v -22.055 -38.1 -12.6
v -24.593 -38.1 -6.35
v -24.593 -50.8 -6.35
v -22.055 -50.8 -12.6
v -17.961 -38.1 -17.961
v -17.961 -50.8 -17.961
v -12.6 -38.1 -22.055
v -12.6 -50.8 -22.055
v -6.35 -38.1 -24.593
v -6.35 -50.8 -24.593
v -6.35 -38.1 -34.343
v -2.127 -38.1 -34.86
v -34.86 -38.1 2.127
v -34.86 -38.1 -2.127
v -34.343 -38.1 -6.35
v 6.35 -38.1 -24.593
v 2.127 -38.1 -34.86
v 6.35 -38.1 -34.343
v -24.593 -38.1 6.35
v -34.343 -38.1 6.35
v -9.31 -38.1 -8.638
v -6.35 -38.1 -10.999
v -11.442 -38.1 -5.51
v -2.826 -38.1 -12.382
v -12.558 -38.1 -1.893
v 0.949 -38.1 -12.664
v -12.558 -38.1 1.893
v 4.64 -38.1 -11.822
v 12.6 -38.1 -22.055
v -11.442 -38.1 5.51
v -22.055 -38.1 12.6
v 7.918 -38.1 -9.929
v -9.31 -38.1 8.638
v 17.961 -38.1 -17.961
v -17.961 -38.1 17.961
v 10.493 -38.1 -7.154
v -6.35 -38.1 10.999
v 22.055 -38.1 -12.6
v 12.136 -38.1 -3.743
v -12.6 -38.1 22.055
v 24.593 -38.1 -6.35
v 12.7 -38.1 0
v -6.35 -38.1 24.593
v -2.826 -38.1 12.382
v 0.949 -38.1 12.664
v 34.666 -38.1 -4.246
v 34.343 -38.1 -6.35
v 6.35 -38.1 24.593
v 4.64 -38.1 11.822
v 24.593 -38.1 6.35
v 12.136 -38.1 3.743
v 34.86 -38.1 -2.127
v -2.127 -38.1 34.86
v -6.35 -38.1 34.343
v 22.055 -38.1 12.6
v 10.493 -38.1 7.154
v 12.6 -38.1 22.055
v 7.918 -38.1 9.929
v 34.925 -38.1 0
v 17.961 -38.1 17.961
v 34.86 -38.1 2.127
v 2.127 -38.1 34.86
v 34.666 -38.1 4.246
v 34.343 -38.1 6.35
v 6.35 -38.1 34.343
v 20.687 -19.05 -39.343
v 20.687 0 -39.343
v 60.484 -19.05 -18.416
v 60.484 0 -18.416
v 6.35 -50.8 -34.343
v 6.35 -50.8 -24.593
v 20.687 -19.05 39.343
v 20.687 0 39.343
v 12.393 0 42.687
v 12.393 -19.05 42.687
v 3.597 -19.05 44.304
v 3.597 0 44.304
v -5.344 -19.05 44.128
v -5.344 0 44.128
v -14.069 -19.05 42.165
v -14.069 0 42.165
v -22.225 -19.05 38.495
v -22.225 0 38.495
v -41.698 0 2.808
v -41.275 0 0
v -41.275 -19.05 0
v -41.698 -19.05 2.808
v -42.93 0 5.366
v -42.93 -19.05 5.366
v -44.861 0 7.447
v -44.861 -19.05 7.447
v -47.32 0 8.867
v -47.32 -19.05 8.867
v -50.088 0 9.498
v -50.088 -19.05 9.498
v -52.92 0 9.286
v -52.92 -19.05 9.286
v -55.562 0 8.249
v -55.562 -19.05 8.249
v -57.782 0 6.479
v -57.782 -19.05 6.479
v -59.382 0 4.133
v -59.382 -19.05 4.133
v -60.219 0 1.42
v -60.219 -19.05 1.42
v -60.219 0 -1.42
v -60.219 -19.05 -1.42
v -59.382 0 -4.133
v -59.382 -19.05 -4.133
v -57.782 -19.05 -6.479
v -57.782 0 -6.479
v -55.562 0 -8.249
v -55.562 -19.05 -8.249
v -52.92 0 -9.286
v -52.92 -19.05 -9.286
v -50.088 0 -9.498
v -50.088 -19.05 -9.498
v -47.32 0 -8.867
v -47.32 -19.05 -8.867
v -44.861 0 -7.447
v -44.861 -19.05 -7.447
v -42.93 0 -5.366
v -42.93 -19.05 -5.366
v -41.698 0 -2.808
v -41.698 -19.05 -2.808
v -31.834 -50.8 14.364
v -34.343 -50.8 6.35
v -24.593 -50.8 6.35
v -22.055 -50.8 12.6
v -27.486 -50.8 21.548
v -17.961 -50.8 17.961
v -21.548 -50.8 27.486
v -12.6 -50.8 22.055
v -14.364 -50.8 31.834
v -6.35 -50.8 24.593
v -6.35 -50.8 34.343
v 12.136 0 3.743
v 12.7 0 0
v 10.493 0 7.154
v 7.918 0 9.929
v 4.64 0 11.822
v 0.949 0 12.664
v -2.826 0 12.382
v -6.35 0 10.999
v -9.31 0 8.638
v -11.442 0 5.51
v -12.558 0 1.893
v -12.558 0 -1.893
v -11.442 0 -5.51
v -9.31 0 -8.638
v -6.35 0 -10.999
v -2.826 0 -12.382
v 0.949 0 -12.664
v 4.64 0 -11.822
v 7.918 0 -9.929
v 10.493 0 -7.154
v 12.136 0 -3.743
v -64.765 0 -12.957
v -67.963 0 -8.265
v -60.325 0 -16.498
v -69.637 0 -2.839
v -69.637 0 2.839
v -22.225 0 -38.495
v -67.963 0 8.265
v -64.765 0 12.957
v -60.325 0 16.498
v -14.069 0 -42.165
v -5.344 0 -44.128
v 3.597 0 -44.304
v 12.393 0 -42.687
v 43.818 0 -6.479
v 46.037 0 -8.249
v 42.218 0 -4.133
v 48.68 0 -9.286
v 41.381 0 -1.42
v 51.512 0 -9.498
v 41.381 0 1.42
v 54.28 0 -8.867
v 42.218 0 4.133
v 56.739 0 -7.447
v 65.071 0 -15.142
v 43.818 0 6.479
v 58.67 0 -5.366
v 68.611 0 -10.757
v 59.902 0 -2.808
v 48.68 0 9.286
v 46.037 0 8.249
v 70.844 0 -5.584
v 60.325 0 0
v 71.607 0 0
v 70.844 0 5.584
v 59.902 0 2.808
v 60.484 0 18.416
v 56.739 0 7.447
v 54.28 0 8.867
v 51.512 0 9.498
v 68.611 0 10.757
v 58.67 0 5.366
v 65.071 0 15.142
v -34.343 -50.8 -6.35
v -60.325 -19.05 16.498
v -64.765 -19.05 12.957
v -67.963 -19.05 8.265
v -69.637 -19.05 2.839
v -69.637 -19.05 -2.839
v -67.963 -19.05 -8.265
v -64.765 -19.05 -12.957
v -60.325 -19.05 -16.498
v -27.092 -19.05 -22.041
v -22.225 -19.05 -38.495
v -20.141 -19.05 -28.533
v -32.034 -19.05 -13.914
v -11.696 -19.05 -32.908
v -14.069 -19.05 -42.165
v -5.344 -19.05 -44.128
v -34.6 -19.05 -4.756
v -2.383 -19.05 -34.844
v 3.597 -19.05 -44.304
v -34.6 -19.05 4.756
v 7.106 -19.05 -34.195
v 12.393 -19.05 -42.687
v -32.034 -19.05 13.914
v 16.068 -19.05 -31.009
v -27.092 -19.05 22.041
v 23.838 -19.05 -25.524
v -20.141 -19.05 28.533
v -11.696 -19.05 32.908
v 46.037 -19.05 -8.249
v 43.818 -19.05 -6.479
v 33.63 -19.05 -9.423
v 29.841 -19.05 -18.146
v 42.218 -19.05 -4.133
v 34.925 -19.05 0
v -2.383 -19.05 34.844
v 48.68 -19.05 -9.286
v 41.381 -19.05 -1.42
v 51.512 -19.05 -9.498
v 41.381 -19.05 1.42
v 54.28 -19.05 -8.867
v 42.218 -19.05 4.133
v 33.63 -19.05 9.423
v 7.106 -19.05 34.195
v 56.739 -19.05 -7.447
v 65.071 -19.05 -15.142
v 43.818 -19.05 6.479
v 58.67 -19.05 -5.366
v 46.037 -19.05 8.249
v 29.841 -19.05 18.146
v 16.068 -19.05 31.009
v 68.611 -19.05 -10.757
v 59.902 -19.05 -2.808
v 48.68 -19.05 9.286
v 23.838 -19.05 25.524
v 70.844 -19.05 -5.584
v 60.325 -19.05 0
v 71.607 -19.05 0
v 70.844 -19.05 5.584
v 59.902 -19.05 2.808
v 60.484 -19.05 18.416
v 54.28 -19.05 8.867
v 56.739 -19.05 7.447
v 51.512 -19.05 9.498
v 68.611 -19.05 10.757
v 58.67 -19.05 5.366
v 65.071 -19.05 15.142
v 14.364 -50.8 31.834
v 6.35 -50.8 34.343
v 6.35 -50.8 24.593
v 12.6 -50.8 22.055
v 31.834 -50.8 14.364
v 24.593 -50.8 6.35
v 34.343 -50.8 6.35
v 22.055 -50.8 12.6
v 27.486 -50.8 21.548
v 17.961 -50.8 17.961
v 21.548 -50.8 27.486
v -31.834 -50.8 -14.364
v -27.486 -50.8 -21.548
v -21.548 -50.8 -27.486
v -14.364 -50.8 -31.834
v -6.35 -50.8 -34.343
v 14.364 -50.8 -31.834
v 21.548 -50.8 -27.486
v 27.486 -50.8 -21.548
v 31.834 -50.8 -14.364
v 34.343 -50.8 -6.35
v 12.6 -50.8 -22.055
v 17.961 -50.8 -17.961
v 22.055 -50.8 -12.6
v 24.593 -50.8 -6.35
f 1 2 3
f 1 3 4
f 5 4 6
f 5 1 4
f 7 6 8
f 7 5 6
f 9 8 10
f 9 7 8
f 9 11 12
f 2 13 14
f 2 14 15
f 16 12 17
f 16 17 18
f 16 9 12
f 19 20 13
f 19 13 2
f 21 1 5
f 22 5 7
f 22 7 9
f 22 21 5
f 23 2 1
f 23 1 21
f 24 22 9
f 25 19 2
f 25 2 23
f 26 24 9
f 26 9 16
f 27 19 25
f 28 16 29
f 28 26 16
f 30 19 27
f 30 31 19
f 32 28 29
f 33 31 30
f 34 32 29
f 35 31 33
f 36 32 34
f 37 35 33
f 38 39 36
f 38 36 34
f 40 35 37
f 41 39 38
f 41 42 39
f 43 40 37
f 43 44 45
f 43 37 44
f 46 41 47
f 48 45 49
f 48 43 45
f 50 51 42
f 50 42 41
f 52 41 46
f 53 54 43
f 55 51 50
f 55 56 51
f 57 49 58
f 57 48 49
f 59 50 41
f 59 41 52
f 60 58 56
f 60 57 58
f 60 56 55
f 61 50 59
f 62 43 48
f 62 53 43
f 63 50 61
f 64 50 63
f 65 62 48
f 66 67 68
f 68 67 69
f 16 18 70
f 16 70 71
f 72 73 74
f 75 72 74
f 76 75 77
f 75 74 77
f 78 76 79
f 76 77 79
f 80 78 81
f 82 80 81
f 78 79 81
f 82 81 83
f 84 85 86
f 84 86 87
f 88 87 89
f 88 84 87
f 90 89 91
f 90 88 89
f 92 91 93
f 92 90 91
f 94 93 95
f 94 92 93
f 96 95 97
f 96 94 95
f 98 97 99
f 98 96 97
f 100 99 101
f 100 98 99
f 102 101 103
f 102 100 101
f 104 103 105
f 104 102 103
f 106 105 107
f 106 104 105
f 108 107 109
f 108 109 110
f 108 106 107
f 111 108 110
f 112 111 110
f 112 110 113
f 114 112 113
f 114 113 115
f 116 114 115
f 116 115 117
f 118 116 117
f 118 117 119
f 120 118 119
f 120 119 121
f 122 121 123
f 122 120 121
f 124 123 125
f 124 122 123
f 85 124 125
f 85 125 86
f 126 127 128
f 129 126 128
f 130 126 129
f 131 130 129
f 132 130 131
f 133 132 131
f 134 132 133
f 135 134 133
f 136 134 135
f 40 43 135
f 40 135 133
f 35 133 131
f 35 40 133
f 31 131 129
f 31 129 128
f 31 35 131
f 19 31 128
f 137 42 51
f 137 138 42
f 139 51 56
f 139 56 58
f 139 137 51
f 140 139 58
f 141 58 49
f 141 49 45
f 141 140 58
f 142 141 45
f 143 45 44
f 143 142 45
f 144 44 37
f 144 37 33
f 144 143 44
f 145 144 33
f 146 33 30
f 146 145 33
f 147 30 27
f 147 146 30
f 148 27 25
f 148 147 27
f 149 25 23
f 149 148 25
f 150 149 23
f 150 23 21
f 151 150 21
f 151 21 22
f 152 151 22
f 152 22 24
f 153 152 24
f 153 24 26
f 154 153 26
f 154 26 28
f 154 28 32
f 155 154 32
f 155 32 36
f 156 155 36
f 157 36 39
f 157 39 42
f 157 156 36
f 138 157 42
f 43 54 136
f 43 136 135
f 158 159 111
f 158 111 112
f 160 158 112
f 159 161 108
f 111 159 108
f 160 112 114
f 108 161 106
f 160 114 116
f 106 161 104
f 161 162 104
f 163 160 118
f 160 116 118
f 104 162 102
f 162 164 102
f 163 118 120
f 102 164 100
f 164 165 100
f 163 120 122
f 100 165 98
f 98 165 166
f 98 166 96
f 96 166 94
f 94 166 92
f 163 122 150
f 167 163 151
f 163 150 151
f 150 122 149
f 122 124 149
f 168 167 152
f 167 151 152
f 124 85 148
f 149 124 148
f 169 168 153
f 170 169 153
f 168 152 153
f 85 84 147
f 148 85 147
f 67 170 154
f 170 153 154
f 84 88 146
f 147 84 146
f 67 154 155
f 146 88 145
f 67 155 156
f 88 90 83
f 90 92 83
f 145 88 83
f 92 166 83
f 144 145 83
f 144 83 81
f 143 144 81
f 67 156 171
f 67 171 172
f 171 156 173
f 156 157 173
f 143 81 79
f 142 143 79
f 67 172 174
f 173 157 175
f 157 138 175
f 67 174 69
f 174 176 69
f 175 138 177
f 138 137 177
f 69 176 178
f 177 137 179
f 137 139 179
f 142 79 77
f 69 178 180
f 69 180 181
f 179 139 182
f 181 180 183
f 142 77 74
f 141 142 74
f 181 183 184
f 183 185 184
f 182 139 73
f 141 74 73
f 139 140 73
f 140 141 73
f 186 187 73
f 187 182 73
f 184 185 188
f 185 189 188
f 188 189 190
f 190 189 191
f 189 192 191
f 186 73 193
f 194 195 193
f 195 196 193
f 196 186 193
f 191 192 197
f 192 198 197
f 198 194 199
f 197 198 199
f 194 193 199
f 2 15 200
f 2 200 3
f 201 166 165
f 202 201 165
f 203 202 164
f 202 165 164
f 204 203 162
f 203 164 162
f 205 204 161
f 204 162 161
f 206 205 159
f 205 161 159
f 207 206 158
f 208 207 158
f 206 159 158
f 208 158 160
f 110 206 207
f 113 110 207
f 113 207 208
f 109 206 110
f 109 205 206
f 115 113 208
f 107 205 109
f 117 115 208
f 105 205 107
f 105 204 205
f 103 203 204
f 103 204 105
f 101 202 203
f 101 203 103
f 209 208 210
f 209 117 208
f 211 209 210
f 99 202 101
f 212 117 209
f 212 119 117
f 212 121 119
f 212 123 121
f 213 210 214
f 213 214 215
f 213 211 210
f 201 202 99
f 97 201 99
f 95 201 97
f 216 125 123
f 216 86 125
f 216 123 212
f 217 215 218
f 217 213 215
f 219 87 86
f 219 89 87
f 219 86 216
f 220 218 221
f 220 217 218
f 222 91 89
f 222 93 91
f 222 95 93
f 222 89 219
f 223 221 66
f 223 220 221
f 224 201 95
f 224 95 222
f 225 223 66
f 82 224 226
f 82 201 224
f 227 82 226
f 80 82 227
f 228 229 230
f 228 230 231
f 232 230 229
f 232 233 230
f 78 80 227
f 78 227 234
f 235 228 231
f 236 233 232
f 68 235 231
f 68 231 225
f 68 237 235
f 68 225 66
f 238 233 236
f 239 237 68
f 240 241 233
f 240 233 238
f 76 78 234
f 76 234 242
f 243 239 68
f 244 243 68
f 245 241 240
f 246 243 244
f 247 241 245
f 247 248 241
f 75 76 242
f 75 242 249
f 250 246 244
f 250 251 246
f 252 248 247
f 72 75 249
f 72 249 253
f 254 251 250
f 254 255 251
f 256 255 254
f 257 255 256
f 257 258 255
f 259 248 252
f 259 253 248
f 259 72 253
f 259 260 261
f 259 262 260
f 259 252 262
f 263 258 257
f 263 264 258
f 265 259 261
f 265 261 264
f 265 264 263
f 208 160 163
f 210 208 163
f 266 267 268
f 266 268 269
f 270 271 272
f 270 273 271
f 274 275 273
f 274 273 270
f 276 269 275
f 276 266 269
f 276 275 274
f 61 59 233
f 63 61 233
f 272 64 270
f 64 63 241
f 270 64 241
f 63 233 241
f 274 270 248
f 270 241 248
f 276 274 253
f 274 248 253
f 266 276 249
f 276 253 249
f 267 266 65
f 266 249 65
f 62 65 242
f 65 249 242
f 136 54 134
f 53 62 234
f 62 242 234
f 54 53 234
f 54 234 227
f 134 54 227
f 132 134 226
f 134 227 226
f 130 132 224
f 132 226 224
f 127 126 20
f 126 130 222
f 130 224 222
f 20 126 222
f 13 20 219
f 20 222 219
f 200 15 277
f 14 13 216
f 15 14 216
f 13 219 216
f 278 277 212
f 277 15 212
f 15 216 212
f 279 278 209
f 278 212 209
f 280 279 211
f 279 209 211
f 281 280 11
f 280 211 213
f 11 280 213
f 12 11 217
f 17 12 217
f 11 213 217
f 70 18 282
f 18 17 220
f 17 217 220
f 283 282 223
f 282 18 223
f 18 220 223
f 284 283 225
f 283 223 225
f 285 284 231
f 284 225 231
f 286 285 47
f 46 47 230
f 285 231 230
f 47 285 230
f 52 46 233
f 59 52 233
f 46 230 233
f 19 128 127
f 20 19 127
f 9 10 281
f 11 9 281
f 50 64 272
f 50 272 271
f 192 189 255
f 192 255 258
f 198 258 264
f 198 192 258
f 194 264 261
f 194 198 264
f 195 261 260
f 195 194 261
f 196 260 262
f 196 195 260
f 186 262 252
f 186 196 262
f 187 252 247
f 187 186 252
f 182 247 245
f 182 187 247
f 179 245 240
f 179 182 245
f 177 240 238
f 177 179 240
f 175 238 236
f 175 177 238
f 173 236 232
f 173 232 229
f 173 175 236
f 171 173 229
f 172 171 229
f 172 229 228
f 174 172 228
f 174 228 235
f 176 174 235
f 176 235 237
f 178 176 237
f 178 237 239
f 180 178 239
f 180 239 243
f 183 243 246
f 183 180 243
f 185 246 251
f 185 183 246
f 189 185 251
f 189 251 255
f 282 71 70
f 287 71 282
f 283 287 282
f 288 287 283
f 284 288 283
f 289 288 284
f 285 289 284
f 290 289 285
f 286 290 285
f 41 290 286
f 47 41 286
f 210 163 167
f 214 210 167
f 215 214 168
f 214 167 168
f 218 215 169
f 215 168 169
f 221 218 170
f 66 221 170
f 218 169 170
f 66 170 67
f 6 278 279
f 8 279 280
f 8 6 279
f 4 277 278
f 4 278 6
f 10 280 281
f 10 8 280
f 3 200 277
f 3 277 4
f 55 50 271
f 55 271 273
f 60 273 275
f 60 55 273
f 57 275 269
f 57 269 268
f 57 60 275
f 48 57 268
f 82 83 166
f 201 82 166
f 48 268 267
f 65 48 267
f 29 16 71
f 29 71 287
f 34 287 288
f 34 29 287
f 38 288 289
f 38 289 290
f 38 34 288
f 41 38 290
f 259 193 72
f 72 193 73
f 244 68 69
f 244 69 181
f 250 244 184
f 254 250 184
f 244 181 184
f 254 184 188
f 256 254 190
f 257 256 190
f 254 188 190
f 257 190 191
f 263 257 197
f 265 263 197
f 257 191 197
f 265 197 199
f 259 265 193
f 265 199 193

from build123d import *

# Parameters (mm, degrees)
F0_R     = 9.525
F0_R_2   = 12.7
F1_DEPTH = 19.05
F2_R     = 34.925
F2_R_2   = 12.7
F3_DEPTH = 19.05
F4_R     = 34.925
F4_R_2   = 25.4
F5_DEPTH = 12.7
F7_DEPTH = 12.7


with BuildPart() as f1:
    # F0 (on Front) → F1 (new body)
    with BuildSketch(Plane.XZ):
        with BuildLine():
            Line((-60.325, -16.497784), (-22.225, -38.494829))
            ThreePointArc((-22.225, -38.494829), (-0.877898, -44.44133), (20.687394, -39.342524))
            Line((20.687394, -39.342524), (60.483871, -18.416429))
            ThreePointArc((60.483871, -18.416429), (71.607263, 0), (60.483871, 18.416429))
            Line((60.483871, 18.416429), (20.687394, 39.342524))
            ThreePointArc((20.687394, 39.342524), (-0.877898, 44.44133), (-22.225, 38.494829))
            Line((-22.225, 38.494829), (-60.325, 16.497784))
            ThreePointArc((-60.325, 16.497784), (-69.85, 0), (-60.325, -16.497784))
        make_face()
        with Locations((-50.8, 0)):
            Circle(F0_R, mode=Mode.SUBTRACT)
        Circle(F0_R_2, mode=Mode.SUBTRACT)
        with Locations((50.8, 0)):
            Circle(F0_R, mode=Mode.SUBTRACT)
    extrude(amount=F1_DEPTH)

    # F2 (on face) → F3 (join)
    with BuildSketch(Plane.XZ.offset(19.05)):
        Circle(F2_R)
        Circle(F2_R_2, mode=Mode.SUBTRACT)
    extrude(amount=F3_DEPTH)

    # F4 (on face) → F5 (join)
    with BuildSketch(Plane.XZ.offset(38.1)):
        Circle(F4_R)
        Circle(F4_R_2, mode=Mode.SUBTRACT)
    extrude(amount=F5_DEPTH)

    # F6 (on face) → F7 (cut)
    with BuildSketch(Plane.XZ.offset(50.8)):
        with BuildLine():
            Line((-6.35, 34.342876), (-6.35, 24.593444))
            ThreePointArc((-6.35, 24.593444), (0, 25.4), (6.35, 24.593444))
            Line((6.35, 24.593444), (6.35, 34.342876))
            ThreePointArc((6.35, 34.342876), (0, 34.925), (-6.35, 34.342876))
        make_face()
        with BuildLine():
            Line((34.342876, 6.35), (24.593444, 6.35))
            ThreePointArc((24.593444, 6.35), (25.4, 0), (24.593444, -6.35))
            Line((24.593444, -6.35), (34.342876, -6.35))
            ThreePointArc((34.342876, -6.35), (34.925, 0), (34.342876, 6.35))
        make_face()
        with BuildLine():
            Line((6.35, -34.342876), (6.35, -24.593444))
            ThreePointArc((6.35, -24.593444), (0, -25.4), (-6.35, -24.593444))
            Line((-6.35, -24.593444), (-6.35, -34.342876))
            ThreePointArc((-6.35, -34.342876), (0, -34.925), (6.35, -34.342876))
        make_face()
        with BuildLine():
            Line((-34.342876, -6.35), (-24.593444, -6.35))
            ThreePointArc((-24.593444, -6.35), (-25.4, 0), (-24.593444, 6.35))
            Line((-24.593444, 6.35), (-34.342876, 6.35))
            ThreePointArc((-34.342876, 6.35), (-34.925, 0), (-34.342876, -6.35))
        make_face()
    extrude(amount=-F7_DEPTH, mode=Mode.SUBTRACT)


solid = f1.part
